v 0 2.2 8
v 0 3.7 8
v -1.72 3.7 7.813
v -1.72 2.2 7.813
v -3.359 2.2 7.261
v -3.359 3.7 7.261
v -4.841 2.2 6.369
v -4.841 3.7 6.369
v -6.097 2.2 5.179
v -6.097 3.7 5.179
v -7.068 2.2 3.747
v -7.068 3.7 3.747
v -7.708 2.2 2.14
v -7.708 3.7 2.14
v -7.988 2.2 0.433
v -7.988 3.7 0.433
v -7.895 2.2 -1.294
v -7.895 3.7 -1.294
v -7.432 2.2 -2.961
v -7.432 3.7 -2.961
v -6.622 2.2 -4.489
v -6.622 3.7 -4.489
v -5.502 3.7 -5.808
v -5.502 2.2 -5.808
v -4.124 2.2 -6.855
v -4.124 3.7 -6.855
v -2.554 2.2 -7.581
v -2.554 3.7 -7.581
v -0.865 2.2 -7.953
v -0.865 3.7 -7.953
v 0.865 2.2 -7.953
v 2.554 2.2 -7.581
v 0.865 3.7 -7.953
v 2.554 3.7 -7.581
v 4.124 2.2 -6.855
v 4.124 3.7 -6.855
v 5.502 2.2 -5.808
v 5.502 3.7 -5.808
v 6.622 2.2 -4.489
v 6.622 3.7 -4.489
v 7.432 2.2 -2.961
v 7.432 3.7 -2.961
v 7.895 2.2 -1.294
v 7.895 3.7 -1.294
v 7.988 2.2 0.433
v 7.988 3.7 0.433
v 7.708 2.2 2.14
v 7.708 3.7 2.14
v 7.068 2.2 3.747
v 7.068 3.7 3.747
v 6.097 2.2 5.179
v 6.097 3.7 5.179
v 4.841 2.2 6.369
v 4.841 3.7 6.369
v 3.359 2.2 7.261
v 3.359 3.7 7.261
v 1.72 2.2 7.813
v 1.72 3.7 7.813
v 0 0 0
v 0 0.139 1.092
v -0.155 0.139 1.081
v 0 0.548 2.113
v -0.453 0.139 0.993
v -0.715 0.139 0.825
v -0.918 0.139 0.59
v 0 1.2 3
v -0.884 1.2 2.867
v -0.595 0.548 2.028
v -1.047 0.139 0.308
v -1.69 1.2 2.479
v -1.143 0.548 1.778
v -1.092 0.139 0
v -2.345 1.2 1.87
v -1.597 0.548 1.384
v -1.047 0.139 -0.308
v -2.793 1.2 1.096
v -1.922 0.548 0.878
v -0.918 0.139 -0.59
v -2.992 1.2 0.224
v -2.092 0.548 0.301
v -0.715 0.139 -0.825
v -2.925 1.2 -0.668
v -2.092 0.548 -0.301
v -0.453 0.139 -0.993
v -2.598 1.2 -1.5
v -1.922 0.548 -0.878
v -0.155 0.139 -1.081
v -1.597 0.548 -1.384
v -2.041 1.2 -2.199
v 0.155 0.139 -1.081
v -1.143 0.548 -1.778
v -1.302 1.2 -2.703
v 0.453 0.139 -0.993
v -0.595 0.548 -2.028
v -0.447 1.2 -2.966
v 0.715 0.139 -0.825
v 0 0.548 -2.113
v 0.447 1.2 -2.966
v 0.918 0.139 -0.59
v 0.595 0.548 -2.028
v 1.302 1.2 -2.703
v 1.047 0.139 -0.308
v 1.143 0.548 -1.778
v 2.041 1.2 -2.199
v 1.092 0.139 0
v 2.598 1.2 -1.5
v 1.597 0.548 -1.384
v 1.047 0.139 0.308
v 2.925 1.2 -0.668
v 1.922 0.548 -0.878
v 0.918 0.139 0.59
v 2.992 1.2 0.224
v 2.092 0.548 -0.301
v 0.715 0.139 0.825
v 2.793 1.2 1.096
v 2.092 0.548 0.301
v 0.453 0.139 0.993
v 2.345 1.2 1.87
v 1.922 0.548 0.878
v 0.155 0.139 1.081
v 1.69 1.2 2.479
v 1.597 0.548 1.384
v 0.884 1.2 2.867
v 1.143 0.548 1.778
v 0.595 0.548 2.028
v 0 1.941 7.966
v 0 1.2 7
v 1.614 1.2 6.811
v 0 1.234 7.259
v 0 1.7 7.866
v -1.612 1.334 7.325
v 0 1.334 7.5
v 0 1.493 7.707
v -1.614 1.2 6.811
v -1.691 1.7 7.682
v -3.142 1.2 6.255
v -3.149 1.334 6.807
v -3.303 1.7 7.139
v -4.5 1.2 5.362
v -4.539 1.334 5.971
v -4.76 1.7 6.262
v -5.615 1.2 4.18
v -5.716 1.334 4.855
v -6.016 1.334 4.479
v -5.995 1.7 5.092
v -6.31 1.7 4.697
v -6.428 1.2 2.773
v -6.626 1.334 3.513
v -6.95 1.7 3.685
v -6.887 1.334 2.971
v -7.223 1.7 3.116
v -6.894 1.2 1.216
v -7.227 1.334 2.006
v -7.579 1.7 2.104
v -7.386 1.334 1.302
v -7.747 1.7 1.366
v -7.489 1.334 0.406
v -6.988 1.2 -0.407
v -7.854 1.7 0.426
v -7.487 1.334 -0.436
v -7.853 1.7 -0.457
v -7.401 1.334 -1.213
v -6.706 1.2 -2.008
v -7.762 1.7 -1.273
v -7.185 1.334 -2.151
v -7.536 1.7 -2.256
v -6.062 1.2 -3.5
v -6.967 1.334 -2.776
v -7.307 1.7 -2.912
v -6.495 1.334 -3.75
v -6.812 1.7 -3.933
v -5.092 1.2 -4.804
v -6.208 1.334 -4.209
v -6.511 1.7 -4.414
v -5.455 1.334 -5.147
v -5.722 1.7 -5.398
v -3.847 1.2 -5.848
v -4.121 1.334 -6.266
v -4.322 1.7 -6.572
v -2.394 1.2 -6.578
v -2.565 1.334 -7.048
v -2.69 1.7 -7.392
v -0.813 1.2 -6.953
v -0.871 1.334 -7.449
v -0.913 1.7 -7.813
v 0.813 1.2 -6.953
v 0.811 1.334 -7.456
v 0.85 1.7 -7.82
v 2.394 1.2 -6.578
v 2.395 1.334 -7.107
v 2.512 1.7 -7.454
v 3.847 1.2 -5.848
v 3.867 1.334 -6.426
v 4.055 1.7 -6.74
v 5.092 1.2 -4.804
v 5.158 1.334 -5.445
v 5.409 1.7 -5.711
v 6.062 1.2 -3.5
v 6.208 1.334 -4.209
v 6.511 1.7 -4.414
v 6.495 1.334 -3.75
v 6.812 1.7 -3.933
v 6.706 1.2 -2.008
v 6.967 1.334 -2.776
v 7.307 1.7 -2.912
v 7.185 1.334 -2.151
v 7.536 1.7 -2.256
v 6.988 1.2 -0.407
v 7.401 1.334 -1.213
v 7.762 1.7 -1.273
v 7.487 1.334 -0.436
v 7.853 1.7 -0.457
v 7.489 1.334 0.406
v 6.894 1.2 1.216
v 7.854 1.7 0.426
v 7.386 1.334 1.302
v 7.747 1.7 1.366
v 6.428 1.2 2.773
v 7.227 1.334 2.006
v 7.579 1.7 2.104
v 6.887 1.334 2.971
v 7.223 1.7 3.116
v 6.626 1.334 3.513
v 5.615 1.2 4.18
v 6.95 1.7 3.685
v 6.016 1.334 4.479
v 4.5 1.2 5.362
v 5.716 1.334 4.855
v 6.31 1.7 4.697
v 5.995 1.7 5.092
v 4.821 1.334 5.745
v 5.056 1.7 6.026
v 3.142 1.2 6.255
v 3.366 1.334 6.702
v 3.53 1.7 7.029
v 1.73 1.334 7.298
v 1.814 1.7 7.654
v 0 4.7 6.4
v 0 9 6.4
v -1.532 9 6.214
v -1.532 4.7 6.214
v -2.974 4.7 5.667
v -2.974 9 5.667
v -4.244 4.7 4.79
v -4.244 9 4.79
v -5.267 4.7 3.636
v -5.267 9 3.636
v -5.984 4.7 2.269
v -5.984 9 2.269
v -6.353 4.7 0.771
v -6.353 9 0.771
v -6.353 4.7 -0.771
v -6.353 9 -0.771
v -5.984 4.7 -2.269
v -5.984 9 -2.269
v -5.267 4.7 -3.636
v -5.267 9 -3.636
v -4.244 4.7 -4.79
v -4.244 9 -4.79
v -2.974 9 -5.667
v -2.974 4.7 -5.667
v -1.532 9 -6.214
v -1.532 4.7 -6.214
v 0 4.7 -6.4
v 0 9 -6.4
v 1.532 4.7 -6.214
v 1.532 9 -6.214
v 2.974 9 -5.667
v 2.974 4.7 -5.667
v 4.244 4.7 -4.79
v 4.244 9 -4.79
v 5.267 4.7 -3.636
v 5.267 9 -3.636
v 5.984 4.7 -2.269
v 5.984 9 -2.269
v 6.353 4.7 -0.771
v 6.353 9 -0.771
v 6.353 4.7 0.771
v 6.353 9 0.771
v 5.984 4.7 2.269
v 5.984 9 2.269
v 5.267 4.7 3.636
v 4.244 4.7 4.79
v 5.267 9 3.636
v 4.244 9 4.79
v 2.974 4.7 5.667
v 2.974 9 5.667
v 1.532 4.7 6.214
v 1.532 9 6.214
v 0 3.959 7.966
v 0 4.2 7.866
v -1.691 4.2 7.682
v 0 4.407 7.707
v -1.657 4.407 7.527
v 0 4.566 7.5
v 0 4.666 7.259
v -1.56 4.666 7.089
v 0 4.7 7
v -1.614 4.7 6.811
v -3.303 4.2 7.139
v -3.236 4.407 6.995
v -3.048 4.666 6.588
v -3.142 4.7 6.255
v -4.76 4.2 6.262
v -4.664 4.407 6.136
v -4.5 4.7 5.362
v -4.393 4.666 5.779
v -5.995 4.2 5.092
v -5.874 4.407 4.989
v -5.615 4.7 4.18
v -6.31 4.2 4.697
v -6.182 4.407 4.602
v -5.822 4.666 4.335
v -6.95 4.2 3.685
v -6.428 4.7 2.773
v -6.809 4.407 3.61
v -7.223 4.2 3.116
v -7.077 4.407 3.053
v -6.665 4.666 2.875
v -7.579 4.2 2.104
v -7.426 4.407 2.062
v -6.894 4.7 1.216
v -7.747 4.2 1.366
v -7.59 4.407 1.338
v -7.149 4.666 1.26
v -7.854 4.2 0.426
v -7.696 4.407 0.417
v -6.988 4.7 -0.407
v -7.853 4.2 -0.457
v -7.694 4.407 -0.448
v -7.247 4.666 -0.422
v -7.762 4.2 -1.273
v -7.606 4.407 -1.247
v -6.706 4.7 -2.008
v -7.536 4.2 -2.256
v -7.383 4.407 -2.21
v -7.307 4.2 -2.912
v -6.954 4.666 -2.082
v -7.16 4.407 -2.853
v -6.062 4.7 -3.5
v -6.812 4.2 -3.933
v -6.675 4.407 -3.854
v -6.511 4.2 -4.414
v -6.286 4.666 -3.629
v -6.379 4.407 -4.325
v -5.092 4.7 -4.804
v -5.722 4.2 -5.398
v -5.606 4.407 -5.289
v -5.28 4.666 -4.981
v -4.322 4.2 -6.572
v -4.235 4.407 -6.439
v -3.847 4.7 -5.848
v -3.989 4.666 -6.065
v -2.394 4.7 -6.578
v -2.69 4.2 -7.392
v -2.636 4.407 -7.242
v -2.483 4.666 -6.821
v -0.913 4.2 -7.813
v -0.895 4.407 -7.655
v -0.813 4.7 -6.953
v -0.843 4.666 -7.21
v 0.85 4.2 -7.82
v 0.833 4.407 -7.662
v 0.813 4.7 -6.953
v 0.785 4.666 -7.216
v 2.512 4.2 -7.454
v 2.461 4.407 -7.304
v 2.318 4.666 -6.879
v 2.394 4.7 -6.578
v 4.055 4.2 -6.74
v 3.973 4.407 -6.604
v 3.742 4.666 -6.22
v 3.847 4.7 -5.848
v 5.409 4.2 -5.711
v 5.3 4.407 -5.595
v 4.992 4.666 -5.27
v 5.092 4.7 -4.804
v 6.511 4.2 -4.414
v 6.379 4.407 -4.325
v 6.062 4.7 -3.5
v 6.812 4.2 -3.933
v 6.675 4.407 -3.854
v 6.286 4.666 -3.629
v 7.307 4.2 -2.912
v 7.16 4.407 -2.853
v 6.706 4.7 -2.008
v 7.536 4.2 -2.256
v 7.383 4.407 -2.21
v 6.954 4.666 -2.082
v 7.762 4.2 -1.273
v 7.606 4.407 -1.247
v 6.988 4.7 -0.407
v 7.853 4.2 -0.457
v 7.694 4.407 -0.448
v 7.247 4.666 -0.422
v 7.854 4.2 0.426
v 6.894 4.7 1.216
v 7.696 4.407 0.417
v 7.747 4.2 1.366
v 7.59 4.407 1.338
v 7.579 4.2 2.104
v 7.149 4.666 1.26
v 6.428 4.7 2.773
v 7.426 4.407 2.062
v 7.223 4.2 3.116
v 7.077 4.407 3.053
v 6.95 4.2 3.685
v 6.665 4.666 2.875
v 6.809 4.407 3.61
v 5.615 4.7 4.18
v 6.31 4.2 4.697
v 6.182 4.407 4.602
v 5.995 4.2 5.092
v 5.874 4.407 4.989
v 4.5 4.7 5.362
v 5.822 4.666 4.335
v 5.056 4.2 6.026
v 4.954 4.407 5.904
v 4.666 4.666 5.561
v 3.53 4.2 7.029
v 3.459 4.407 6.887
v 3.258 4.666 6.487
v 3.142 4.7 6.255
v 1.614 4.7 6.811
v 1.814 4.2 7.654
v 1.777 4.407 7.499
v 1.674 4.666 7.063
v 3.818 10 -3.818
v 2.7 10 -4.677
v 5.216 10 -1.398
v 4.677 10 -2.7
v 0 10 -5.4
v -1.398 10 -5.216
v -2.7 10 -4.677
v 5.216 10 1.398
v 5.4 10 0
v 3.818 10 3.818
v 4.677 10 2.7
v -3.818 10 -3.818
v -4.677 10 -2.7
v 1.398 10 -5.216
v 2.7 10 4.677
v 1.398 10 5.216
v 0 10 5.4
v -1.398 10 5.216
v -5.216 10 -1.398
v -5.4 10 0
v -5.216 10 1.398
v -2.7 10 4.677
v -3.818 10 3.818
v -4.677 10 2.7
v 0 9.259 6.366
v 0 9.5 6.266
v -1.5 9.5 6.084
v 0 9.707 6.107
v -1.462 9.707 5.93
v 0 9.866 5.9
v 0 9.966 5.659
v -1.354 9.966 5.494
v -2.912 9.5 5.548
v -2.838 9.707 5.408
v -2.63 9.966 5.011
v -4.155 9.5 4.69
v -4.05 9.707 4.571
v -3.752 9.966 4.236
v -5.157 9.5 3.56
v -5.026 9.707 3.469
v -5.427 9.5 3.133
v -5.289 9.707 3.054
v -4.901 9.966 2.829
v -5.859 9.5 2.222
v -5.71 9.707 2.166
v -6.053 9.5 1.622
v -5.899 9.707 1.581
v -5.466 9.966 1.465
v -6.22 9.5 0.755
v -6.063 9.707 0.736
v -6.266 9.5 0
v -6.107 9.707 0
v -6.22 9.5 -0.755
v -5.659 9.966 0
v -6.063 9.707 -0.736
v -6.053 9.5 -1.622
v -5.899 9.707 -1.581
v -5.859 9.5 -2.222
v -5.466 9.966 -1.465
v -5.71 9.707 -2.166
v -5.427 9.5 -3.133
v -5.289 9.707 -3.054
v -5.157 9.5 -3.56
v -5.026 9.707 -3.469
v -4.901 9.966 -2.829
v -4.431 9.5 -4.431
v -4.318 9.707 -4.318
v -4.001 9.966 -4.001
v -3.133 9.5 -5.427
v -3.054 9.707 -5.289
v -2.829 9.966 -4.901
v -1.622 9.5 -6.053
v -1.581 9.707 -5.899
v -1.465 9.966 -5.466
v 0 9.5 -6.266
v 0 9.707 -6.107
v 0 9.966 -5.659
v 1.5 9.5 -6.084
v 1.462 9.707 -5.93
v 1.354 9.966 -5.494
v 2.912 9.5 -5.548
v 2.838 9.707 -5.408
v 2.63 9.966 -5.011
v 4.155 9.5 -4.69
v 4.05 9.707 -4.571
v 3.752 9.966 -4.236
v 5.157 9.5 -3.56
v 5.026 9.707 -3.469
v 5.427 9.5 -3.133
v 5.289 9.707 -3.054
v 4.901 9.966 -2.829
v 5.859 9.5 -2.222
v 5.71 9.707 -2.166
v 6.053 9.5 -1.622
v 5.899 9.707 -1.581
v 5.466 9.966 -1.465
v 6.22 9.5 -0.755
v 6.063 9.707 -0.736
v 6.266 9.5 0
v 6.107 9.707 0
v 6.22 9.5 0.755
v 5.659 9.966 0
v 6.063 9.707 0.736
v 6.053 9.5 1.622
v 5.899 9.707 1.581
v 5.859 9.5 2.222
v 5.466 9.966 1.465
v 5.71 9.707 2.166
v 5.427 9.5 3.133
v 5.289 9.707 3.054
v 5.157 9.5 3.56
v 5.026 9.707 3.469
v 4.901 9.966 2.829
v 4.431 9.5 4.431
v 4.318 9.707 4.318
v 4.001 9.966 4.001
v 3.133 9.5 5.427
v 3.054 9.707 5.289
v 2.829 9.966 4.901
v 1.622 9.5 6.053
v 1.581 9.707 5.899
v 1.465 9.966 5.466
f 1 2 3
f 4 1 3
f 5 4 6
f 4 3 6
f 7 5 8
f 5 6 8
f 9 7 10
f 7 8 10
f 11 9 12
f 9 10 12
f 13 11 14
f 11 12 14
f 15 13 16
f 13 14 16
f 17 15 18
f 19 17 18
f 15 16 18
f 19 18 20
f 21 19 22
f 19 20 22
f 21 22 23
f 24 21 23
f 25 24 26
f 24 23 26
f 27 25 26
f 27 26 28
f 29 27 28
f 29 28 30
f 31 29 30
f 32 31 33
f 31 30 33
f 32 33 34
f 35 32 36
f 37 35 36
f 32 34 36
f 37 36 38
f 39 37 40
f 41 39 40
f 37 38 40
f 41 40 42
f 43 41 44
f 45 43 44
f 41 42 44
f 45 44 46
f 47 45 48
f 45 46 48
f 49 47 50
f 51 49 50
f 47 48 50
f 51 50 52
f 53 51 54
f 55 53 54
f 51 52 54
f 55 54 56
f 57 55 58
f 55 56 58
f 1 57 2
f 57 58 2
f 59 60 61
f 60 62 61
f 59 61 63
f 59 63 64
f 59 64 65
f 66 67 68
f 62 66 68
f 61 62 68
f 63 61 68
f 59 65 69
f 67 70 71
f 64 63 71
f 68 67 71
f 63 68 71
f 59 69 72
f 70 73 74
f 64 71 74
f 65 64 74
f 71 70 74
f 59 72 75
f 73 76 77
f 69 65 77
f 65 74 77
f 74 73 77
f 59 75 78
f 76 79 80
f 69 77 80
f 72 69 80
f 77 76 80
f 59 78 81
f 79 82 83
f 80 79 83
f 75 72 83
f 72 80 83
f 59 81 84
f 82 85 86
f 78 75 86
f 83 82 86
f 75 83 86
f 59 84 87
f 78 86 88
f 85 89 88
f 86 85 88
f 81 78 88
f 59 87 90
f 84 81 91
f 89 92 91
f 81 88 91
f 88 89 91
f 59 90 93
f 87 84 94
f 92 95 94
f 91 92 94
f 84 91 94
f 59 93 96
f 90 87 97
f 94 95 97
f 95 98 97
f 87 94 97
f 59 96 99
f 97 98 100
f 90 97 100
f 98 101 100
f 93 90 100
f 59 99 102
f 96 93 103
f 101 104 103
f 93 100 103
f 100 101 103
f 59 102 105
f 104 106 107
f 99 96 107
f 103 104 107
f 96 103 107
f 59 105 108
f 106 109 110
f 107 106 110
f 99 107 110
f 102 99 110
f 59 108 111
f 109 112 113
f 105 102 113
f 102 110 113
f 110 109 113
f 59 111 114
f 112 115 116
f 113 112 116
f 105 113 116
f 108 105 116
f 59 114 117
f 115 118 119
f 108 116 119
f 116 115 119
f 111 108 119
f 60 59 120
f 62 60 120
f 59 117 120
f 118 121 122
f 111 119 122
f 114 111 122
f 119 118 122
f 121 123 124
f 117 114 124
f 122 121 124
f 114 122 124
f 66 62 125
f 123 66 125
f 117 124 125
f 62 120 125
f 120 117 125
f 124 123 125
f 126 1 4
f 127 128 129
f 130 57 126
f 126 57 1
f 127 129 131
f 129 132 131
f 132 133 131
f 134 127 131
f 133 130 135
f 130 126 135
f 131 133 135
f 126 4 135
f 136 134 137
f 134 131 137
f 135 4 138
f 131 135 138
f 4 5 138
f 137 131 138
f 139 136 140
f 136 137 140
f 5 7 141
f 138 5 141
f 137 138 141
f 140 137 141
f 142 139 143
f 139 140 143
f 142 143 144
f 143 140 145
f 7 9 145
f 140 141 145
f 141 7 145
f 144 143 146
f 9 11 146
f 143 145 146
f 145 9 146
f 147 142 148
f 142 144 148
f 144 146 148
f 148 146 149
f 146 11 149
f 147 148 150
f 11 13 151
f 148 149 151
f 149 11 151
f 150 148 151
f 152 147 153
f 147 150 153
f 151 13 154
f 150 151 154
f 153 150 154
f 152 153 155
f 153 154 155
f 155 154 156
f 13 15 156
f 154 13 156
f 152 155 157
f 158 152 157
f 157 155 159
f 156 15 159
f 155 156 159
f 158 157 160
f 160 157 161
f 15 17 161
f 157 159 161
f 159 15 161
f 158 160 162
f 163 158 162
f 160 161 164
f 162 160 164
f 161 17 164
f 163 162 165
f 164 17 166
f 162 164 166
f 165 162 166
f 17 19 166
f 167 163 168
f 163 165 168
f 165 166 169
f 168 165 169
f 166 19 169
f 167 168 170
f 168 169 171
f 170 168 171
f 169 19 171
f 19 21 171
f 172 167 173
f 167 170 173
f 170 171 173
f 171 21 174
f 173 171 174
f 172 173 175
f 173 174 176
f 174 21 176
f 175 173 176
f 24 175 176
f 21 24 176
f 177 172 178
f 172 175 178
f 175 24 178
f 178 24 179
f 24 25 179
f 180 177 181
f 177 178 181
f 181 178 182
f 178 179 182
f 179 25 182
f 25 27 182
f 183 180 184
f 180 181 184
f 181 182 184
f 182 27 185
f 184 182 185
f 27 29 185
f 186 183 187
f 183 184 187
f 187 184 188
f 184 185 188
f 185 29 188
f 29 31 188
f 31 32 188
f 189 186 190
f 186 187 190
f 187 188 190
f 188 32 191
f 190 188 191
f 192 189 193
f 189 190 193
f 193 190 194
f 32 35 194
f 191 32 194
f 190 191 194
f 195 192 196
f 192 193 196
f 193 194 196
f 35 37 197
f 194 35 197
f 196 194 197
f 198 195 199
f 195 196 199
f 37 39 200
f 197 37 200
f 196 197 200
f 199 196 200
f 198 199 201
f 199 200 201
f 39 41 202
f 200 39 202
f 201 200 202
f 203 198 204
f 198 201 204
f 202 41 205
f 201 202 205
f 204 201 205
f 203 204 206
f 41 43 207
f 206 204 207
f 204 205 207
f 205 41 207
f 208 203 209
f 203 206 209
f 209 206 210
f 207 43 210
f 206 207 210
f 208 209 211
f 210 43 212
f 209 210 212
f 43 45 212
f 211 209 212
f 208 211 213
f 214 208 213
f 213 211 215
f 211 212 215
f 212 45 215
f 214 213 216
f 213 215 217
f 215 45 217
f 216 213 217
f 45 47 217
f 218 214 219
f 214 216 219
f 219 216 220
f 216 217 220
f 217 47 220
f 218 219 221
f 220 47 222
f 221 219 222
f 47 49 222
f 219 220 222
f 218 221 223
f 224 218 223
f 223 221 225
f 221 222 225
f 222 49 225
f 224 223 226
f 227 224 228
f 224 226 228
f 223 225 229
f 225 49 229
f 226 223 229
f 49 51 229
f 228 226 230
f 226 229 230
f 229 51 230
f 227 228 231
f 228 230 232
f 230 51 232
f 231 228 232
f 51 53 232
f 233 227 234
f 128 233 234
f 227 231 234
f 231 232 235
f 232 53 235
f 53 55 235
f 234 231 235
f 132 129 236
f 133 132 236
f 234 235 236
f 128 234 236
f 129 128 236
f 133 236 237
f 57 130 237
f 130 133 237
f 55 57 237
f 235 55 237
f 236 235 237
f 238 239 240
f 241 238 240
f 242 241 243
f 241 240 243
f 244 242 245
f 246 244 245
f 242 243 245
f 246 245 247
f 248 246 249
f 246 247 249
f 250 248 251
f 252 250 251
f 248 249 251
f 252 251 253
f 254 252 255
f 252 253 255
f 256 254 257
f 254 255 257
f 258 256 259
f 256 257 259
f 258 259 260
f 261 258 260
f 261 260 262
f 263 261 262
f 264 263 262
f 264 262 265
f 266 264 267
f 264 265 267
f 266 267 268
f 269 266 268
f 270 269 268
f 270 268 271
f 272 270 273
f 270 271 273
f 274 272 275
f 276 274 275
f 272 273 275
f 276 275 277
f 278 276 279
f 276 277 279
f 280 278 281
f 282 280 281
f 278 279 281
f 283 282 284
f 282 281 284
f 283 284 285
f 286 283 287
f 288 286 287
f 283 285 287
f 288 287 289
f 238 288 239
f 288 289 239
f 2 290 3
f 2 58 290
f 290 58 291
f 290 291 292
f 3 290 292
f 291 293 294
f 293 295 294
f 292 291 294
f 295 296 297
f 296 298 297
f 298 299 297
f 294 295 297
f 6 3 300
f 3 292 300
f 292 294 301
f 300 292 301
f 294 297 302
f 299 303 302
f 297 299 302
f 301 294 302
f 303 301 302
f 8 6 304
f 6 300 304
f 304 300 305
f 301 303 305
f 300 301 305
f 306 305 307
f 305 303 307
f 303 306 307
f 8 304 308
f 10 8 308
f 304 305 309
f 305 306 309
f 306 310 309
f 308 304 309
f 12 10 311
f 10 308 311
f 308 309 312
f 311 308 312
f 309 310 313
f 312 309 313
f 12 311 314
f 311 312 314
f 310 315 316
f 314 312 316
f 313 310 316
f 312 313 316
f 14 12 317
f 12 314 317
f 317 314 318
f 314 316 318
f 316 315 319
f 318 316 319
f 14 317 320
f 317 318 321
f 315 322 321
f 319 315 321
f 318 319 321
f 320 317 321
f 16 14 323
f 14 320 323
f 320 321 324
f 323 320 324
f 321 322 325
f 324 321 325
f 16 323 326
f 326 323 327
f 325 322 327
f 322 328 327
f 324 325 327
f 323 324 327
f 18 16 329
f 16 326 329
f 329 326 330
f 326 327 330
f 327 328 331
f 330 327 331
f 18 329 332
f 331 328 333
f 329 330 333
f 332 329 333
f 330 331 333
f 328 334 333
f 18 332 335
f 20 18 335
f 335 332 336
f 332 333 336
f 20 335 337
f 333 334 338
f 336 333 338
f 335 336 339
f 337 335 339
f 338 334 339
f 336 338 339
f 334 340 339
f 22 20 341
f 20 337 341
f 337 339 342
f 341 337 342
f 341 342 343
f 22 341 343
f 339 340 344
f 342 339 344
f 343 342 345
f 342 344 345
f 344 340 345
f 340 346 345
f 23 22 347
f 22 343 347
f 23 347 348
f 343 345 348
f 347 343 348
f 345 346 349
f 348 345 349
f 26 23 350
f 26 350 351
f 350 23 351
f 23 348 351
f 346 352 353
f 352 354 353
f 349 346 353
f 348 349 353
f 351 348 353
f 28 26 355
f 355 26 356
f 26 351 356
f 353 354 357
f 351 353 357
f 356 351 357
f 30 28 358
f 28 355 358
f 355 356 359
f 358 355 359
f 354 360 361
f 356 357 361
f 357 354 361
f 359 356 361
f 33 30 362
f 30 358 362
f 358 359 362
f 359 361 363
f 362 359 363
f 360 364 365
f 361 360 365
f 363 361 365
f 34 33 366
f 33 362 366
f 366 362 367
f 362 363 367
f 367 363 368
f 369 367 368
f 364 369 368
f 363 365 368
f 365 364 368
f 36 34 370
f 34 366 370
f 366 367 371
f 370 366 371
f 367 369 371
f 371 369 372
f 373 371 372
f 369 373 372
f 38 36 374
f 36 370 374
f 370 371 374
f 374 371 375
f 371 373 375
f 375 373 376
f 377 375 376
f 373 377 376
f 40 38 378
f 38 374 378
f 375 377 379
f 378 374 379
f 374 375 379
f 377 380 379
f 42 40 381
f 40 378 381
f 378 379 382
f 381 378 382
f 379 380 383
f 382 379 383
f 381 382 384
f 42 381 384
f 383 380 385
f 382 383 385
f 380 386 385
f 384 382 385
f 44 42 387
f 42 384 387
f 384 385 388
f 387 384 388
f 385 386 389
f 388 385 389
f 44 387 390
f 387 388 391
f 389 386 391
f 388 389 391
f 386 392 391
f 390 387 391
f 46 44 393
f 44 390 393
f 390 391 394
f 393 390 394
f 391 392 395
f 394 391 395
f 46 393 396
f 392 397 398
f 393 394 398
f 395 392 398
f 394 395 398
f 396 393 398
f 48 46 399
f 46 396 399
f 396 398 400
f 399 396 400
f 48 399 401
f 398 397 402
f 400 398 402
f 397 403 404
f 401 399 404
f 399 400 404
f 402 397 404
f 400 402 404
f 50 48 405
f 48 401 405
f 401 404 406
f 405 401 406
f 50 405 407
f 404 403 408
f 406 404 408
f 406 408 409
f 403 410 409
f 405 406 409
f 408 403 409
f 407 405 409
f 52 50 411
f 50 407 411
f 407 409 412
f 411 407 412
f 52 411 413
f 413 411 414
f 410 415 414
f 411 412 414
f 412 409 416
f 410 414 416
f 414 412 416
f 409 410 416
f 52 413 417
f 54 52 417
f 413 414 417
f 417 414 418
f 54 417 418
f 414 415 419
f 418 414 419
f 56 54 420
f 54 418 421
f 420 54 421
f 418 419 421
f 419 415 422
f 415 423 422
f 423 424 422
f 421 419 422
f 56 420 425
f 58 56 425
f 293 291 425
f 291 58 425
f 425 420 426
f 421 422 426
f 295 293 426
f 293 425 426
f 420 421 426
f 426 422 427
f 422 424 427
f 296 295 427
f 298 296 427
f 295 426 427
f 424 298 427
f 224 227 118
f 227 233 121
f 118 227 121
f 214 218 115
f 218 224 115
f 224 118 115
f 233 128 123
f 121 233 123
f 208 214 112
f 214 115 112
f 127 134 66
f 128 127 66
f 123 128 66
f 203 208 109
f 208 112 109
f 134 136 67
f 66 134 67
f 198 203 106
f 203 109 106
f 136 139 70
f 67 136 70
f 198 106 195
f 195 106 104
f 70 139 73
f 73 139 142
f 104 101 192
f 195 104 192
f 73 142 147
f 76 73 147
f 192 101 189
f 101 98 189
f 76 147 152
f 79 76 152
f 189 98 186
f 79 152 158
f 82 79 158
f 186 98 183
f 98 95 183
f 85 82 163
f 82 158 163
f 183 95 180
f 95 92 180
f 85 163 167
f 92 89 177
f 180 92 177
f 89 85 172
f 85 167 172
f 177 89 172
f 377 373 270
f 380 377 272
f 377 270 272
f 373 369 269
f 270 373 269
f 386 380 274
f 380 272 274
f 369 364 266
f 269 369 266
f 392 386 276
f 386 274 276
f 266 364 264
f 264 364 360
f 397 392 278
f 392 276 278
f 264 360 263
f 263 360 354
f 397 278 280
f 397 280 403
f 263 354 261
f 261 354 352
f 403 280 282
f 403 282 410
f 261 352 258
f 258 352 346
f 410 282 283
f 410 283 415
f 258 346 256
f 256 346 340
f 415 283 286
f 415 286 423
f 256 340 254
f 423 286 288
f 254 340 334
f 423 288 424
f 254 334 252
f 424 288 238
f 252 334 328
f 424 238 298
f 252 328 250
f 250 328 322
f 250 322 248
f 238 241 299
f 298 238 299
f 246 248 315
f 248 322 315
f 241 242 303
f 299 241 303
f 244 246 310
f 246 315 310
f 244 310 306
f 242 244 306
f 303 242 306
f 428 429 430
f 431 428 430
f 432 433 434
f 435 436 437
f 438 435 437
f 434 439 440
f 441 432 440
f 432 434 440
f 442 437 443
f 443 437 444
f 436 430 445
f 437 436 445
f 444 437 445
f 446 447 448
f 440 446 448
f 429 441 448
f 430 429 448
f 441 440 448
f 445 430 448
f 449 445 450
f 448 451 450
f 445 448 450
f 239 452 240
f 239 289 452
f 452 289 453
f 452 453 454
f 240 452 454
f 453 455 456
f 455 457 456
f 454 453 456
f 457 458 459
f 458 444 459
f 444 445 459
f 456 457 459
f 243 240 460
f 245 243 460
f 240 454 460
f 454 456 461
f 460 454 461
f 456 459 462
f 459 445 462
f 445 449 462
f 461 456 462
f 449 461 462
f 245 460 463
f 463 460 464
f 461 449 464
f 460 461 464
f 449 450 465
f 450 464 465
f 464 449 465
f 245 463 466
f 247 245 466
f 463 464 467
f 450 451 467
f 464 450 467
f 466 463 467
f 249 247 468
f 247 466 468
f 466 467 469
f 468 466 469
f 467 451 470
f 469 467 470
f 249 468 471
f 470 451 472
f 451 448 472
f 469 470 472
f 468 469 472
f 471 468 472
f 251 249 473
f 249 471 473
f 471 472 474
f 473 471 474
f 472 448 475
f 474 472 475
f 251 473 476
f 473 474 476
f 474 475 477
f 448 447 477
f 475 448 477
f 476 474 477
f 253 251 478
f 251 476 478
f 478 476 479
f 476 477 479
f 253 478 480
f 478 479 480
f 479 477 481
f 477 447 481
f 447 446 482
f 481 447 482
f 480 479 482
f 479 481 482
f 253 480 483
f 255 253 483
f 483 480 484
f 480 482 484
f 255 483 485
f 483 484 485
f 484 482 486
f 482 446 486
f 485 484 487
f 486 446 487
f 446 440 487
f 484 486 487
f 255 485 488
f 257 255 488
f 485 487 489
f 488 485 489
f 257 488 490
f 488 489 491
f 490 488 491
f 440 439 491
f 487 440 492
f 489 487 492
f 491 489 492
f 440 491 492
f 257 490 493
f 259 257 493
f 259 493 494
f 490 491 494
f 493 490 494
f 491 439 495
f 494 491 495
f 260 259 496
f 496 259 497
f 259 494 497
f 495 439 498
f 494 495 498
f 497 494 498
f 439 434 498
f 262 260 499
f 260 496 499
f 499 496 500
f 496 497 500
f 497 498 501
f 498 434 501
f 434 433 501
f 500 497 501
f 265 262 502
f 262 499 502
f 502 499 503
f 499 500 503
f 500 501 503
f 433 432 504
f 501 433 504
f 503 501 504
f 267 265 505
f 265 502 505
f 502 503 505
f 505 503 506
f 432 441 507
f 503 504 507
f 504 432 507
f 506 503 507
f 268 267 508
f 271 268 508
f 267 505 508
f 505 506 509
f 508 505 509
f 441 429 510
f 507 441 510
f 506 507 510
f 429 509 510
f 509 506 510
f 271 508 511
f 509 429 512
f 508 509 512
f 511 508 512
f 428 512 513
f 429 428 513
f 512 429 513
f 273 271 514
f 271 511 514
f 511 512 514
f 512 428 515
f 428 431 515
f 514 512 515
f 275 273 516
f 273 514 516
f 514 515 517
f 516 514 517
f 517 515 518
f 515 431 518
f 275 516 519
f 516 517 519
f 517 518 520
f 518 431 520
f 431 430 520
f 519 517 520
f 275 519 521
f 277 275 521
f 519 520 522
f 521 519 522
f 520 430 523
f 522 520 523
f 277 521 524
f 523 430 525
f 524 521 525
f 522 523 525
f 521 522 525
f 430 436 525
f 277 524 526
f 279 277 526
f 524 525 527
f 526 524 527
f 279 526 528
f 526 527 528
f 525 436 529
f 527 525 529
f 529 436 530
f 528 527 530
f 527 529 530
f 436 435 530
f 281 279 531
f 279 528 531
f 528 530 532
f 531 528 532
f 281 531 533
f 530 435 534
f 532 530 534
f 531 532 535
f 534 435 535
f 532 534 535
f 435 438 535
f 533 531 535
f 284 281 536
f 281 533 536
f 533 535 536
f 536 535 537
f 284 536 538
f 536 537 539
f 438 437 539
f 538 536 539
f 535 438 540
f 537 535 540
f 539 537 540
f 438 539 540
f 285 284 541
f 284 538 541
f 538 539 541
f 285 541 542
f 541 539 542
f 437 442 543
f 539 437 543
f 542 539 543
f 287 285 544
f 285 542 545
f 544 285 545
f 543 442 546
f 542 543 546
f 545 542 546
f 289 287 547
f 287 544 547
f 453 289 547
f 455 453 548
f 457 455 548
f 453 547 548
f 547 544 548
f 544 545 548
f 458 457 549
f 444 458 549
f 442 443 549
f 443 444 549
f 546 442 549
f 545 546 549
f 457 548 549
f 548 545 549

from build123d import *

# Parameters (mm, degrees)
CONG_1_R = 1


with BuildPart() as part:
    # Esquisse1 → Révolution1 (revolve)
    with BuildSketch(Plane.XY, mode=Mode.PRIVATE) as r_volution1_sk:
        with BuildLine():
            Line((3, 1.2), (8, 1.2))
            Line((8, 1.2), (8, 4.7))
            Line((8, 4.7), (6.4, 4.7))
            Line((6.4, 4.7), (6.4, 10))
            Line((6.4, 10), (0, 10))
            Line((0, 10), (0, 0))
            ThreePointArc((0, 0), (1.615549442, 0.311126395), (3, 1.2))
        make_face()
    revolve(r_volution1_sk.sketch.rotate(Axis((0, 10, 0), (0, -1, 0)), 90), axis=Axis((0, 10, 0), (0, -1, 0)))

    # Congé1
    cong_1_edges = [part.edges().sort_by_distance(p)[0] for p in [
        (0, 10, -6.4),
        (0, 4.7, -8),
        (0, 1.2, -8),
    ]]
    fillet(cong_1_edges, radius=CONG_1_R)


solid = part.part
